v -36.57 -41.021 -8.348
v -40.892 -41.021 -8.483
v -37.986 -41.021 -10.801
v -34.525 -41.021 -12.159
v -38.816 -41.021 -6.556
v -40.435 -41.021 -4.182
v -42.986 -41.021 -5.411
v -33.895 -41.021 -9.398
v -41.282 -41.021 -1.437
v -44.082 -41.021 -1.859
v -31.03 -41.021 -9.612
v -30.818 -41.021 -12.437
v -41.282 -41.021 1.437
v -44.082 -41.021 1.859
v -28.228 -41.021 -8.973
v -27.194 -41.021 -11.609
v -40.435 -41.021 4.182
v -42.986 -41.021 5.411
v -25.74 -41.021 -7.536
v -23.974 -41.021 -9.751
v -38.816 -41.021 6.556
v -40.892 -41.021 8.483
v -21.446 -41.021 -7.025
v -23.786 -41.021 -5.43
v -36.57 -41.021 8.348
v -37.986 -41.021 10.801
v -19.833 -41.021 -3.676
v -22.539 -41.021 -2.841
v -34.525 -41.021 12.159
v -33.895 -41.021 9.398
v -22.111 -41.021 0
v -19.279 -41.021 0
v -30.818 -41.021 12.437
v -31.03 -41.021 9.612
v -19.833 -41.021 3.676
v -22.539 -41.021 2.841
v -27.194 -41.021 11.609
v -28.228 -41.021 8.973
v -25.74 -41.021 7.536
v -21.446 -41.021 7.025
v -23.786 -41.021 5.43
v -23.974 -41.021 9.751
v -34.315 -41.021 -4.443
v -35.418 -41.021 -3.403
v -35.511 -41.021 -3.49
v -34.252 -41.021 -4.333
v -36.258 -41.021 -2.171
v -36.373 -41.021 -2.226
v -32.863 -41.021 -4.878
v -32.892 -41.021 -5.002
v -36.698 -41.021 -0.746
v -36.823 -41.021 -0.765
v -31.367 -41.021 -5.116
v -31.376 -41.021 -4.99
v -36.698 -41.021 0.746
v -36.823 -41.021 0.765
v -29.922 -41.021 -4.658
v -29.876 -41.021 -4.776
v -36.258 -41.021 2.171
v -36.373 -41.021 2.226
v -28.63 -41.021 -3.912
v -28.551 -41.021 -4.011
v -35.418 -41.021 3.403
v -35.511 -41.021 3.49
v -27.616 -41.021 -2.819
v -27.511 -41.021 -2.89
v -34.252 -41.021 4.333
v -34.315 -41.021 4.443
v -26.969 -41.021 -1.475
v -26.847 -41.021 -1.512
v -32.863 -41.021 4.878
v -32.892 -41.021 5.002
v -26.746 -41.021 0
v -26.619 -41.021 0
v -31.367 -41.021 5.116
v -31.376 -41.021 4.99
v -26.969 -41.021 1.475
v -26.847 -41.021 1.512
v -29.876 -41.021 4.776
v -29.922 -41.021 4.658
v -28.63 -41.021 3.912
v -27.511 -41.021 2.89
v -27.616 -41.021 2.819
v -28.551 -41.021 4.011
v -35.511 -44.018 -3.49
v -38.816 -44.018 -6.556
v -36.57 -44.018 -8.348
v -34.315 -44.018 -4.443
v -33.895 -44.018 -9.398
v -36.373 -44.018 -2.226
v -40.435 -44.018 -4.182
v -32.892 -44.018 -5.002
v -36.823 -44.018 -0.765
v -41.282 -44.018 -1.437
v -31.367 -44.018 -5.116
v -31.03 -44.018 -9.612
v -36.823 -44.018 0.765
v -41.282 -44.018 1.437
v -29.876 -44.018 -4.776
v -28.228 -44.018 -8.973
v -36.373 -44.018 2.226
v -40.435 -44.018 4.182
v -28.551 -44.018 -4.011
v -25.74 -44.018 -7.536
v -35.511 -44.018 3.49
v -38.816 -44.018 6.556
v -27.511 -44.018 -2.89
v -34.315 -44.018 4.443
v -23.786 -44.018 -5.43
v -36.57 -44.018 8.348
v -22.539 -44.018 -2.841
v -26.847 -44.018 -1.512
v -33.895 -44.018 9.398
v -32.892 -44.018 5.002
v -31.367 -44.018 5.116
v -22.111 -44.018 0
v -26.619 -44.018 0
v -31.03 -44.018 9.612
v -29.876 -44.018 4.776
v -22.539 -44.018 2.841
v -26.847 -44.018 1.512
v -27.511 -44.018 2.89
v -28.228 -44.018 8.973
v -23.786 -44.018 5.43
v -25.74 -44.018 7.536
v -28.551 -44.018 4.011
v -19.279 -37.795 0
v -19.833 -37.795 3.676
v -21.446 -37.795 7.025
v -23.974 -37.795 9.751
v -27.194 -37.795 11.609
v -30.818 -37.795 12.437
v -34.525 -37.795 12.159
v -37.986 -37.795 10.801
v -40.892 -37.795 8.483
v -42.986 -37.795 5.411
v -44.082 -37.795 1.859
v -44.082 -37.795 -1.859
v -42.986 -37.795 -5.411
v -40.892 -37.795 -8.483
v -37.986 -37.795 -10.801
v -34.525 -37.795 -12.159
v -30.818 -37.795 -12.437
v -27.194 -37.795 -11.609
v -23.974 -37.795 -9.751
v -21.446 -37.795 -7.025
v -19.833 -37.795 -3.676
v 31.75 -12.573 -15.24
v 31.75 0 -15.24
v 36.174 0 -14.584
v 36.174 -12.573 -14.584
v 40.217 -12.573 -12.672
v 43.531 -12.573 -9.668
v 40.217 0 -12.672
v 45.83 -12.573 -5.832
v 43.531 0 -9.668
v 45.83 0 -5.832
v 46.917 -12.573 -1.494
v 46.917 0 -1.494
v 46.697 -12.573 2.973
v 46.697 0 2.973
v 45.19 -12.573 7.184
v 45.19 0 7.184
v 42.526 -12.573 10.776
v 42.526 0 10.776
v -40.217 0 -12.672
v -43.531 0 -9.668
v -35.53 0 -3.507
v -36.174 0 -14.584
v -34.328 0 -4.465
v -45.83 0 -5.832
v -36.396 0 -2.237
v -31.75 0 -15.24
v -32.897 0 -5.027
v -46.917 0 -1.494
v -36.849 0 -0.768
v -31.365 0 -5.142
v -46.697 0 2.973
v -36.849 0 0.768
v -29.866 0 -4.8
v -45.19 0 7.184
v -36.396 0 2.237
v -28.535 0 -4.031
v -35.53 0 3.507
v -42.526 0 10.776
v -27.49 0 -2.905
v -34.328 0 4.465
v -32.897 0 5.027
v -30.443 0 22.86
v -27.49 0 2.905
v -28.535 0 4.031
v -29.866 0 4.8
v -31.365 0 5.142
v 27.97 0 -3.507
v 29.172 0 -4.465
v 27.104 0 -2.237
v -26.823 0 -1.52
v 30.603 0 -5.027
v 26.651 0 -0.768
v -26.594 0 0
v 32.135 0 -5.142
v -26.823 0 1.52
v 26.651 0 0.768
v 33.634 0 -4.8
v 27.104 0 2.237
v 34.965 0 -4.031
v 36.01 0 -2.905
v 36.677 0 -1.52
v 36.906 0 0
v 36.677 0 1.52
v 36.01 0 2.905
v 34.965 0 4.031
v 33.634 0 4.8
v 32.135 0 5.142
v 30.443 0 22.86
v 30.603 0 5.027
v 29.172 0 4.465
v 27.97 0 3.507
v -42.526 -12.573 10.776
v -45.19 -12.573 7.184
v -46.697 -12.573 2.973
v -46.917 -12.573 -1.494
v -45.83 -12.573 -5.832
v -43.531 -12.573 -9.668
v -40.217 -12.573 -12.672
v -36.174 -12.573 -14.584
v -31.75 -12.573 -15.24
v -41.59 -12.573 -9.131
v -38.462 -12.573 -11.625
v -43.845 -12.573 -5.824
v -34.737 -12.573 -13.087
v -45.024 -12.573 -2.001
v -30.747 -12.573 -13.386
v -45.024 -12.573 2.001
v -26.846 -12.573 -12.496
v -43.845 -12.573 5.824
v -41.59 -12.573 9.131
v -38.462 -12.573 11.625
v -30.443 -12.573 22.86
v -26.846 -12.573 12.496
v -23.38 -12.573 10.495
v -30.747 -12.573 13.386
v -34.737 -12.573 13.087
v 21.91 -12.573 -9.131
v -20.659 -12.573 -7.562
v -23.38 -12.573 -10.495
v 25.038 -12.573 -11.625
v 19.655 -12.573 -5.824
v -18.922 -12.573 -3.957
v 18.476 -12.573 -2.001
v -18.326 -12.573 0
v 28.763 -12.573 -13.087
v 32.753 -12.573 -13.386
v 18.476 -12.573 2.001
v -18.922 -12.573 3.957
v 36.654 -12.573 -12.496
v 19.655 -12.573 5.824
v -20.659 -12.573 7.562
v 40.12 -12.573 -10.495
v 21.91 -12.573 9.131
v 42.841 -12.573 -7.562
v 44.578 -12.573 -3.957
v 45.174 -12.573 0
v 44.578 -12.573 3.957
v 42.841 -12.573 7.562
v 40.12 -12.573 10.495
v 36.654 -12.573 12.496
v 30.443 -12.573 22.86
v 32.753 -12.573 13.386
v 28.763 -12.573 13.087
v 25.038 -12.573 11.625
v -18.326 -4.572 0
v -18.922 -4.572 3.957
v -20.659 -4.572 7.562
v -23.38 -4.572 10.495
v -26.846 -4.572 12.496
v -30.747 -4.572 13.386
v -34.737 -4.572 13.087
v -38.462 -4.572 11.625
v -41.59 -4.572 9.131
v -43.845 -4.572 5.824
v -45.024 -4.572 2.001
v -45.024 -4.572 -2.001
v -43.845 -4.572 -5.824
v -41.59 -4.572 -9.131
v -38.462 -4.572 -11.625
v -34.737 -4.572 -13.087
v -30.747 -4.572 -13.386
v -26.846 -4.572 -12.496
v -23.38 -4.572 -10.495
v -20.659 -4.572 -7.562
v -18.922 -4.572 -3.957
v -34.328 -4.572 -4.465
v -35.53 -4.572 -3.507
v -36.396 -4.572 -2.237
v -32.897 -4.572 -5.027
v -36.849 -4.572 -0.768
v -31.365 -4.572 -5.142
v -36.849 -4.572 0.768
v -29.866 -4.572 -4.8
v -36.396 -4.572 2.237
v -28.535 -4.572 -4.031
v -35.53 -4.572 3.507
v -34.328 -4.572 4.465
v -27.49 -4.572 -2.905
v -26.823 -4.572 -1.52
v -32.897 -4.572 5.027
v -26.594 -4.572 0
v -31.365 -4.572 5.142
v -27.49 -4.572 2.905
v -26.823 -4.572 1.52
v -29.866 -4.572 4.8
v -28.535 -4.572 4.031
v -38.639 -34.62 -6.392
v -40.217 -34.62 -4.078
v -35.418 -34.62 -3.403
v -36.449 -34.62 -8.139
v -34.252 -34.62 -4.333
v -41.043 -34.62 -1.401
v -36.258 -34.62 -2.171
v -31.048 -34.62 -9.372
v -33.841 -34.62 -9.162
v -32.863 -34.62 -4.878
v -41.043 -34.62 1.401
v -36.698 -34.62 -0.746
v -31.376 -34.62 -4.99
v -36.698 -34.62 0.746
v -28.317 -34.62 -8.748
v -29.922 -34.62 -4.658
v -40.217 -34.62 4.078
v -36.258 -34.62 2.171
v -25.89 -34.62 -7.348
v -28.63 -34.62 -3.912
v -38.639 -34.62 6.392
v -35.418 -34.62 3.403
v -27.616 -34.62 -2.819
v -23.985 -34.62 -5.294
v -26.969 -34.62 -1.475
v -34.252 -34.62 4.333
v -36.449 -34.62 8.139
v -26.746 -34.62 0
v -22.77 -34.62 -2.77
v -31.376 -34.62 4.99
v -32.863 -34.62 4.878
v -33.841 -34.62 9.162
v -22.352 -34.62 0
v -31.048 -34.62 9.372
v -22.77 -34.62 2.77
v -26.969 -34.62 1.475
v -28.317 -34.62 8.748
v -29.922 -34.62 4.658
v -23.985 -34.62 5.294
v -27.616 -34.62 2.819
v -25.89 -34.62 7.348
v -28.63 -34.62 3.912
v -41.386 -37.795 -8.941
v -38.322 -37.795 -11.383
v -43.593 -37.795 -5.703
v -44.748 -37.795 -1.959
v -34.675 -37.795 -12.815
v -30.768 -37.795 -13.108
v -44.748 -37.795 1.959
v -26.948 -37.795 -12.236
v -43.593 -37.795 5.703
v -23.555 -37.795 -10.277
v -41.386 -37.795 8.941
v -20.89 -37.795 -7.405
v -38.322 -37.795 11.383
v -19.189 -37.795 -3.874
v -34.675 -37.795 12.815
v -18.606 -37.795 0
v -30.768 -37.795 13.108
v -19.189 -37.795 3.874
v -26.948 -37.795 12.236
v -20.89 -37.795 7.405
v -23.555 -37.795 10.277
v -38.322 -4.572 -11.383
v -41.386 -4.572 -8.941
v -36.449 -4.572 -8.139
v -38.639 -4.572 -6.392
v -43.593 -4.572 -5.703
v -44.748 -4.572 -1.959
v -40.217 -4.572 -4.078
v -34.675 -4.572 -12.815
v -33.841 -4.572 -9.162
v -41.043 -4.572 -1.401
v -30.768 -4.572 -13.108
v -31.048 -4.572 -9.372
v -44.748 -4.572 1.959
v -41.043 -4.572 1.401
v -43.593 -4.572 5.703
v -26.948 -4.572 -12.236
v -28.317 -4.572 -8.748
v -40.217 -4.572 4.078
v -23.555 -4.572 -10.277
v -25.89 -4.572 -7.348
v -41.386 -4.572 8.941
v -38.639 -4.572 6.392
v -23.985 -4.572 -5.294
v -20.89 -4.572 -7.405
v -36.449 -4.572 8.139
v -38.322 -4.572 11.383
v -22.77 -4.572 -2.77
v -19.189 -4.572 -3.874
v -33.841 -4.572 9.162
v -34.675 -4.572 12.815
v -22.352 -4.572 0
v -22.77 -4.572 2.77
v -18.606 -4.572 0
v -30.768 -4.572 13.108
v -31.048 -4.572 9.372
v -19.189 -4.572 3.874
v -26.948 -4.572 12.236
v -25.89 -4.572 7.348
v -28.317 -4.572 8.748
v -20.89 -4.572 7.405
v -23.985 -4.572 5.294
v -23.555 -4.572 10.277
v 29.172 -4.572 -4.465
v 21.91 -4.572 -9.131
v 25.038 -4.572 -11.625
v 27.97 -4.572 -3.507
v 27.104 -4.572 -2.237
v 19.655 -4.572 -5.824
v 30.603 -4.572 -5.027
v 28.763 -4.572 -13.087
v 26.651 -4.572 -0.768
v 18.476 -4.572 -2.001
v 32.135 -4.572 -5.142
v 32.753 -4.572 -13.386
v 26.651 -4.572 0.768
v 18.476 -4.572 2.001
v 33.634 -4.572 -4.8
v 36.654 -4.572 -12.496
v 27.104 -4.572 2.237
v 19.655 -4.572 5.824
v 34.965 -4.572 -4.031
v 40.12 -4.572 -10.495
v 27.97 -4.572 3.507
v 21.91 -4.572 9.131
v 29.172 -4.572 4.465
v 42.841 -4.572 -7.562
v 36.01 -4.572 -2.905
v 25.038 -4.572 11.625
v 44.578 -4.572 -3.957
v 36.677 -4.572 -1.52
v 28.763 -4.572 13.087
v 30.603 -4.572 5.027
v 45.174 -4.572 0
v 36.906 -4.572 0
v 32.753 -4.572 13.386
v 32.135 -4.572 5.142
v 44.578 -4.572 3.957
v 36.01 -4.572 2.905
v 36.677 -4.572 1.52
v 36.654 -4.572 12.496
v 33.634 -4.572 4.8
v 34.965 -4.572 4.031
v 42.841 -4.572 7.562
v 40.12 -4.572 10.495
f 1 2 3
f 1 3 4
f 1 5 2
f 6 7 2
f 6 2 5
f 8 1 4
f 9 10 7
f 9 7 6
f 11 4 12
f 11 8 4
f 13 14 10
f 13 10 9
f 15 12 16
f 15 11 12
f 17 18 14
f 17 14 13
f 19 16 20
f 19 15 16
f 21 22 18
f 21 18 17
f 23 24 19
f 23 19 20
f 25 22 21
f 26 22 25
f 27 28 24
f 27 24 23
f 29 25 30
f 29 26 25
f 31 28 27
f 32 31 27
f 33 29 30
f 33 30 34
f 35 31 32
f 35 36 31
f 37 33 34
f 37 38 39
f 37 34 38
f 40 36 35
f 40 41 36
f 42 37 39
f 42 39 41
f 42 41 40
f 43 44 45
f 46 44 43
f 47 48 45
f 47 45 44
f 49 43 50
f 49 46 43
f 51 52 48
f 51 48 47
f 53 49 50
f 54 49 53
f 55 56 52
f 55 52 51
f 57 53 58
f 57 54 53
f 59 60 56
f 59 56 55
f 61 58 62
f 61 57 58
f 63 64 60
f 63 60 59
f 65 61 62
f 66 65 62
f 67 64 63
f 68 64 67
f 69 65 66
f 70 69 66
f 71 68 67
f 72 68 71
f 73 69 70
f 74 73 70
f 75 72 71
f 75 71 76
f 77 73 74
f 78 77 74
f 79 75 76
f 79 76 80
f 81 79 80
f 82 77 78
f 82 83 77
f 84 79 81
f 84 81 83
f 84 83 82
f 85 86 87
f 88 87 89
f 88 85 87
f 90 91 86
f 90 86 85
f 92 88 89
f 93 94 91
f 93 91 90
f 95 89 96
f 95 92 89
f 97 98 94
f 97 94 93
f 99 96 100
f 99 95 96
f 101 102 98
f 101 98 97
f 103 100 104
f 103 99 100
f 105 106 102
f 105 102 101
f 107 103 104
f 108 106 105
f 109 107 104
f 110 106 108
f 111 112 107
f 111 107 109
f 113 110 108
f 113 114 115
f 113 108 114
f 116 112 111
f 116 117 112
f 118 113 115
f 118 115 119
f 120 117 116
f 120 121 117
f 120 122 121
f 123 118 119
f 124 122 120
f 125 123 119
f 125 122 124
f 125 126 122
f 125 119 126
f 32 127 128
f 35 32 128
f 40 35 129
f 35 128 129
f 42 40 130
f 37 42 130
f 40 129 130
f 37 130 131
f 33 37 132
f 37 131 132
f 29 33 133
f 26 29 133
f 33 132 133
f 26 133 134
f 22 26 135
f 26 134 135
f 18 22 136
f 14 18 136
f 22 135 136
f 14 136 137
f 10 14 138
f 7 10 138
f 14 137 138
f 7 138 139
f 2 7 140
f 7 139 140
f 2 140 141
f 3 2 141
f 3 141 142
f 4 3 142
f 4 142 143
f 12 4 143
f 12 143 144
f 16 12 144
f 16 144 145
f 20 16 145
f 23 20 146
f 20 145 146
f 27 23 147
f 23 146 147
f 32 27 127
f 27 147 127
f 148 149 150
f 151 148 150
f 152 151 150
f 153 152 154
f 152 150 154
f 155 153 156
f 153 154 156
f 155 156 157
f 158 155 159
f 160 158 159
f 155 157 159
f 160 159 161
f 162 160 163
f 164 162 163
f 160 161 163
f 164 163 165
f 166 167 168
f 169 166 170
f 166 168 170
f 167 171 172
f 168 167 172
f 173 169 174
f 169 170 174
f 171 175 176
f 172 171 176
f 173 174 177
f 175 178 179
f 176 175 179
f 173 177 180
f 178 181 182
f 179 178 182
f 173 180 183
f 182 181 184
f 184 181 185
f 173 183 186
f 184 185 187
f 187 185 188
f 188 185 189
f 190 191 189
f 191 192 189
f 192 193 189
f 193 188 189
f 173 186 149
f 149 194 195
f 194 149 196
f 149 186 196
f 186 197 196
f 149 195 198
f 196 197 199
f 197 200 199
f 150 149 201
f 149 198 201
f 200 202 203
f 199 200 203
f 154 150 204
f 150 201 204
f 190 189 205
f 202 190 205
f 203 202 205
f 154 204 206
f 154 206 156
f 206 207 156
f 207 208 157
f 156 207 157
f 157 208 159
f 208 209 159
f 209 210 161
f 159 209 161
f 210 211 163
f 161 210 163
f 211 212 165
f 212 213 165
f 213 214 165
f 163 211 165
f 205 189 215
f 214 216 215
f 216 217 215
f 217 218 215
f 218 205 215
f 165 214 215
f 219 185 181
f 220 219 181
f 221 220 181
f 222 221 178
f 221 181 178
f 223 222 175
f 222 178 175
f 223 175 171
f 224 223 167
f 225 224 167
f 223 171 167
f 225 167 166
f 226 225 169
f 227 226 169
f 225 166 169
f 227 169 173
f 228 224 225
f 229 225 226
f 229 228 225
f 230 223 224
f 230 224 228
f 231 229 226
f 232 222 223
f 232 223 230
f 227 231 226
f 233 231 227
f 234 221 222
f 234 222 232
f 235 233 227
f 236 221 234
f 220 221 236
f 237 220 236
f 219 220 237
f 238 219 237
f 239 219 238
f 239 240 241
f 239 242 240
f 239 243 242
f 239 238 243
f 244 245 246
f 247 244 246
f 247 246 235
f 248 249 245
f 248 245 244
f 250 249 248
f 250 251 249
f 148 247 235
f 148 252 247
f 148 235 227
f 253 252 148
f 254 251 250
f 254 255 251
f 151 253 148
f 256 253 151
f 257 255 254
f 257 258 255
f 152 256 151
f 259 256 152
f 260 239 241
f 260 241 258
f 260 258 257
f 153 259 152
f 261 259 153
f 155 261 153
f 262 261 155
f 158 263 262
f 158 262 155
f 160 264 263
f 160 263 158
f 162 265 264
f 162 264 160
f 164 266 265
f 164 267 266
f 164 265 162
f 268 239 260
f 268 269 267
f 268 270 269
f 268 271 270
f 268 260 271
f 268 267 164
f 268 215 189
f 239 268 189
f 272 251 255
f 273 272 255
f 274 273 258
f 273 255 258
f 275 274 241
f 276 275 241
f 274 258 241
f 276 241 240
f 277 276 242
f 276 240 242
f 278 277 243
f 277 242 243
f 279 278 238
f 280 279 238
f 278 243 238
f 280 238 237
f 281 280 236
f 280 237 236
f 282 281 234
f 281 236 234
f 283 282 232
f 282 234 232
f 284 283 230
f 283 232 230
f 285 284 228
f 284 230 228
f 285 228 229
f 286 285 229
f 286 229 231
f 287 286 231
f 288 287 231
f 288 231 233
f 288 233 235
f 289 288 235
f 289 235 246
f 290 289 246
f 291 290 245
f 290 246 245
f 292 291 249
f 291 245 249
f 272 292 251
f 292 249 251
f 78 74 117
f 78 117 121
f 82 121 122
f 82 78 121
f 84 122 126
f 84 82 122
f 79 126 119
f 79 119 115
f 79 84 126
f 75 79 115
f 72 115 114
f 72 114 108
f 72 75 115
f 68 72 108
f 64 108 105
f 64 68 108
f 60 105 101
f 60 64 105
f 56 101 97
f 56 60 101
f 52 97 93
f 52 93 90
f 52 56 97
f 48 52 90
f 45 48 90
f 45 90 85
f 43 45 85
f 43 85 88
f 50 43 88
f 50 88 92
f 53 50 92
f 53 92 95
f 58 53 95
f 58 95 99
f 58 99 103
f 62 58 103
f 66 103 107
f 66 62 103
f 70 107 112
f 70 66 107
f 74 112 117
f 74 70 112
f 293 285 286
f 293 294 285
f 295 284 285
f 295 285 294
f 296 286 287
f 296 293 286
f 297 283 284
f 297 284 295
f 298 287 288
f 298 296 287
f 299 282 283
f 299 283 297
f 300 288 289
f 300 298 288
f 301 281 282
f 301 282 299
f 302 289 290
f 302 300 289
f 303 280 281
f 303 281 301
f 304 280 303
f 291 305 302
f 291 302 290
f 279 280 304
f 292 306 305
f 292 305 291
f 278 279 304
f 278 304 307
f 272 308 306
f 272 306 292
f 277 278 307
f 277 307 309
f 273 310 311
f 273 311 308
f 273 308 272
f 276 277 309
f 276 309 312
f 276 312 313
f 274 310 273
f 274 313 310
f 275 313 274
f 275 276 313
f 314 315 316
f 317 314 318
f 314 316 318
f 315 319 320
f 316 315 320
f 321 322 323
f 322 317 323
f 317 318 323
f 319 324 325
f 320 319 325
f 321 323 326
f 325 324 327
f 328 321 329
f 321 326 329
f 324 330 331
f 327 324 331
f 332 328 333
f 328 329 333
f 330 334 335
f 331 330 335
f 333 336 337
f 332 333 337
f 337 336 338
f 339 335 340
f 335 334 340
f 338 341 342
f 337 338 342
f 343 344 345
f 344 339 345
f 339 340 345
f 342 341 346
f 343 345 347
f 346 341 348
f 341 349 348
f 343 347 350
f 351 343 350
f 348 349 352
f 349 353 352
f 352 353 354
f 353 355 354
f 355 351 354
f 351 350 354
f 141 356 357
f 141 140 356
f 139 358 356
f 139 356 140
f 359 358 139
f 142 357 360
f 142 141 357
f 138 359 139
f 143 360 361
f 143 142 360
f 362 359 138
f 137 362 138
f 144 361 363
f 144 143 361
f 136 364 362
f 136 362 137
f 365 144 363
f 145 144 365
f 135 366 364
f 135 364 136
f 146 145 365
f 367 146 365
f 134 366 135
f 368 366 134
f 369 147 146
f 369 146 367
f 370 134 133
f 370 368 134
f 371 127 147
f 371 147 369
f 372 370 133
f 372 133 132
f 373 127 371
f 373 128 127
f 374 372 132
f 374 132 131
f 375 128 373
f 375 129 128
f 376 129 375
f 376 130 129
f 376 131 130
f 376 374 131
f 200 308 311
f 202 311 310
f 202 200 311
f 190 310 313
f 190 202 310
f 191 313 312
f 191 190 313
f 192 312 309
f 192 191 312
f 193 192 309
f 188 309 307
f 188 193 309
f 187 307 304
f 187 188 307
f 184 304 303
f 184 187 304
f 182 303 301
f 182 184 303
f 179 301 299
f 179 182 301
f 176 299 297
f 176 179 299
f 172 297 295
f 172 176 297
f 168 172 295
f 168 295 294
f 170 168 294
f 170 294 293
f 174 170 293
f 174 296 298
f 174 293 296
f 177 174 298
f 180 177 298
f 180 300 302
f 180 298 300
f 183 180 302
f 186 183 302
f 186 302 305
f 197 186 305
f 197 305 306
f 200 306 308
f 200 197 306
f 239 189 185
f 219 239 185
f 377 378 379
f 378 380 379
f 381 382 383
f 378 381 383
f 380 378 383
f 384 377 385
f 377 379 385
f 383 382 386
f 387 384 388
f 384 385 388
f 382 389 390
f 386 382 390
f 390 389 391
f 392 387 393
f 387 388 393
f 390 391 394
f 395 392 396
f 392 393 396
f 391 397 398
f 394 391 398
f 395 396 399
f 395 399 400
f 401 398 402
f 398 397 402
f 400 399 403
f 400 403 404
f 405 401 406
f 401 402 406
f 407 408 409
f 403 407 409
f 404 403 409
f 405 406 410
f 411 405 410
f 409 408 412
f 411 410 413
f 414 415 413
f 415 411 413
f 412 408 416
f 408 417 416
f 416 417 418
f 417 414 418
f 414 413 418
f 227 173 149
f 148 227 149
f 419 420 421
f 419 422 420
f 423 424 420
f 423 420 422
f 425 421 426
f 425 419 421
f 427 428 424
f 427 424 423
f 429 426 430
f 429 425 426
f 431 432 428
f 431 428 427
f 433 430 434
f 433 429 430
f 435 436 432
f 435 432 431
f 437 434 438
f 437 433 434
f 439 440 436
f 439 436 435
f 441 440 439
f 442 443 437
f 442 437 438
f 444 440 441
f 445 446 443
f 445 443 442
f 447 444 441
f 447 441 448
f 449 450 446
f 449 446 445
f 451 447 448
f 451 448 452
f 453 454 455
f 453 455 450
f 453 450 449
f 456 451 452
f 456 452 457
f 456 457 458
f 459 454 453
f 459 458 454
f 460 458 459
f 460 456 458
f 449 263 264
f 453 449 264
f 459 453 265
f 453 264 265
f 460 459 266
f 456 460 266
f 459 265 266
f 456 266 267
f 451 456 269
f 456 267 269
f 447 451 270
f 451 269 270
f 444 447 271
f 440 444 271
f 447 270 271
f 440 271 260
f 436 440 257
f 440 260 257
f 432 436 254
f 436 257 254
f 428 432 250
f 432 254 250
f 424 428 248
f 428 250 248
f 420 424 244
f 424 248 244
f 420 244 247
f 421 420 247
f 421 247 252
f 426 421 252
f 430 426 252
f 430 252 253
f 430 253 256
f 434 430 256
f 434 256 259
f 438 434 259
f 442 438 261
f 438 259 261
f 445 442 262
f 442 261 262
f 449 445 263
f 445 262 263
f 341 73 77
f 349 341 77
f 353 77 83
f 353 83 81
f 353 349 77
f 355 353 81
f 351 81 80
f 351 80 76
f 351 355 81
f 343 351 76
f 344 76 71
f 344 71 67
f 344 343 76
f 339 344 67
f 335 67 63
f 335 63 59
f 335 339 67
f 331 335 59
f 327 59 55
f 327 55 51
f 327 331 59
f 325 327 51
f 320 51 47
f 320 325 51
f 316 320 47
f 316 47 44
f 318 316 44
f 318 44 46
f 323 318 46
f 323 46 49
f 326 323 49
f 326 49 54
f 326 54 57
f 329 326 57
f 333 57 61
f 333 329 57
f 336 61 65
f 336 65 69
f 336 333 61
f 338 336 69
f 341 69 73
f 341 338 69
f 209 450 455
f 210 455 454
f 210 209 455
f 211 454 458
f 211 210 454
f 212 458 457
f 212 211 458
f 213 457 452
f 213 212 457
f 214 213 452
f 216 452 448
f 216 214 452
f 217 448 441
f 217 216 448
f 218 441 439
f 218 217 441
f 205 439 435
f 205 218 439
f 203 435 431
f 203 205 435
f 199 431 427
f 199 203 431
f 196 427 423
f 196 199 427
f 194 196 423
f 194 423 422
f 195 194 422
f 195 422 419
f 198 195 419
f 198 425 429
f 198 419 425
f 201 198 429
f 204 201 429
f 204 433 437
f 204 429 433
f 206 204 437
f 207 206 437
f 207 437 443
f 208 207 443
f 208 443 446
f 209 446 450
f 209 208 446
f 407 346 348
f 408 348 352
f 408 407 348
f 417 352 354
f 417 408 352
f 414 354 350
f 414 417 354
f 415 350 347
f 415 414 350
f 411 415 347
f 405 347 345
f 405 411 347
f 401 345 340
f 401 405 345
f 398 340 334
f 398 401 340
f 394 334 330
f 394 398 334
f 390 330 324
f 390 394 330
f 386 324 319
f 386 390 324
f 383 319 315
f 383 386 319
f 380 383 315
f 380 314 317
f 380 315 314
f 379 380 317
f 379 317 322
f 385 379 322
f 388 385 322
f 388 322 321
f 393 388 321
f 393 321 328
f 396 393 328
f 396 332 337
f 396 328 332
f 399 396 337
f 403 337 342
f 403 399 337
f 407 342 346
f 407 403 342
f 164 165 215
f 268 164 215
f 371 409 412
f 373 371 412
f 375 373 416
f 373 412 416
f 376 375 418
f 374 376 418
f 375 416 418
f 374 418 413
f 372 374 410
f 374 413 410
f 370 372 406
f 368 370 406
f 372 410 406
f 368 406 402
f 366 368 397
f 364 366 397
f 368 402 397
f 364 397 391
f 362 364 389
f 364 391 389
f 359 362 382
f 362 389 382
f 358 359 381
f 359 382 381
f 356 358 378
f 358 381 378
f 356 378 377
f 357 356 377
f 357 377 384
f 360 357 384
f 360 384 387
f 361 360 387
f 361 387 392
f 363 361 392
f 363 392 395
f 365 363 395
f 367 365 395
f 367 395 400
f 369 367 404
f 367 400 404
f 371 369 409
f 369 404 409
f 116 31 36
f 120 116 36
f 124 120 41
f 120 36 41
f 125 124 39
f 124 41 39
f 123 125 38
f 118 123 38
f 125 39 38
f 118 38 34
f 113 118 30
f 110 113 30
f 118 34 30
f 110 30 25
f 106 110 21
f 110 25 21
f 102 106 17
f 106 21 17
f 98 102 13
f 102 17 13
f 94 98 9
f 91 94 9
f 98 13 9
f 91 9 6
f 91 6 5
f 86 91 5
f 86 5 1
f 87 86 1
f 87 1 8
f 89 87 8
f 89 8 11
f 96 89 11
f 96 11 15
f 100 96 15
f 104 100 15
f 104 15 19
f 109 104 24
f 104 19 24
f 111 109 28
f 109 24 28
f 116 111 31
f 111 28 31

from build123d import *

# Parameters (mm, degrees)
F0_R      = 5.1562
F1_DEPTH  = 12.573
F2_R      = 13.4239
F3_DEPTH  = 8.001
F4_R      = 13.1445
F4_R_2    = 9.398
F5_DEPTH  = 33.2232
F6_R      = 9.4361
F6_R_2    = 5.0038
F7_DEPTH  = 3.175
F8_R      = 12.4714
F8_R_2    = 5.0038
F9_DEPTH  = 3.2258
F10_R     = 9.6393
F10_R_2   = 5.1308
F11_DEPTH = 2.9972


with BuildPart() as f1:
    # F0 (on Front) → F1 (new body)
    with BuildSketch(Plane.XZ):
        with BuildLine():
            ThreePointArc((-42.526307, 10.776307), (-45.829924, -5.832096), (-31.75, -15.24))
            Line((-31.75, -15.24), (31.75, -15.24))
            ThreePointArc((31.75, -15.24), (45.829924, -5.832096), (42.526307, 10.776307))
            Line((42.526307, 10.776307), (30.442615, 22.86))
            Line((30.442615, 22.86), (-30.442615, 22.86))
            Line((-30.442615, 22.86), (-42.526307, 10.776307))
        make_face()
        with Locations((-31.75, 0)):
            Circle(F0_R, mode=Mode.SUBTRACT)
        with Locations((31.75, 0)):
            Circle(F0_R, mode=Mode.SUBTRACT)
    extrude(amount=F1_DEPTH)

    # F2 (on face) → F3 (cut)
    with BuildSketch(Plane.XZ.offset(12.573)):
        with Locations((-31.75, 0)):
            Circle(F2_R)
        with Locations((31.75, 0)):
            Circle(F2_R)
    extrude(amount=-F3_DEPTH, mode=Mode.SUBTRACT)


with BuildPart() as f5:
    # F4 (on face) → F5 (new body)
    with BuildSketch(Plane.XZ.offset(4.572)):
        with Locations((-31.75, 0)):
            Circle(F4_R)
        with Locations((-31.75, 0)):
            Circle(F4_R_2, mode=Mode.SUBTRACT)
    extrude(amount=F5_DEPTH)

    # F6 (on face) → F7 (join)
    with BuildSketch(Plane.XZ.offset(37.7952)):
        with Locations((-31.75, 0)):
            Circle(F6_R)
        with Locations((-31.75, 0)):
            Circle(F6_R_2, mode=Mode.SUBTRACT)
    extrude(amount=-F7_DEPTH)

    # F8 (on face) → F9 (join)
    with BuildSketch(Plane.XZ.offset(37.7952)):
        with Locations((-31.75, 0)):
            Circle(F8_R)
        with Locations((-31.75, 0)):
            Circle(F8_R_2, mode=Mode.SUBTRACT)
    extrude(amount=F9_DEPTH)

    # F10 (on face) → F11 (join)
    with BuildSketch(Plane.XZ.offset(41.021)):
        with Locations((-31.75, 0)):
            Circle(F10_R)
        with Locations((-31.75, 0)):
            Circle(F10_R_2, mode=Mode.SUBTRACT)
    extrude(amount=F11_DEPTH)


solid = Compound([f1.part, f5.part])
